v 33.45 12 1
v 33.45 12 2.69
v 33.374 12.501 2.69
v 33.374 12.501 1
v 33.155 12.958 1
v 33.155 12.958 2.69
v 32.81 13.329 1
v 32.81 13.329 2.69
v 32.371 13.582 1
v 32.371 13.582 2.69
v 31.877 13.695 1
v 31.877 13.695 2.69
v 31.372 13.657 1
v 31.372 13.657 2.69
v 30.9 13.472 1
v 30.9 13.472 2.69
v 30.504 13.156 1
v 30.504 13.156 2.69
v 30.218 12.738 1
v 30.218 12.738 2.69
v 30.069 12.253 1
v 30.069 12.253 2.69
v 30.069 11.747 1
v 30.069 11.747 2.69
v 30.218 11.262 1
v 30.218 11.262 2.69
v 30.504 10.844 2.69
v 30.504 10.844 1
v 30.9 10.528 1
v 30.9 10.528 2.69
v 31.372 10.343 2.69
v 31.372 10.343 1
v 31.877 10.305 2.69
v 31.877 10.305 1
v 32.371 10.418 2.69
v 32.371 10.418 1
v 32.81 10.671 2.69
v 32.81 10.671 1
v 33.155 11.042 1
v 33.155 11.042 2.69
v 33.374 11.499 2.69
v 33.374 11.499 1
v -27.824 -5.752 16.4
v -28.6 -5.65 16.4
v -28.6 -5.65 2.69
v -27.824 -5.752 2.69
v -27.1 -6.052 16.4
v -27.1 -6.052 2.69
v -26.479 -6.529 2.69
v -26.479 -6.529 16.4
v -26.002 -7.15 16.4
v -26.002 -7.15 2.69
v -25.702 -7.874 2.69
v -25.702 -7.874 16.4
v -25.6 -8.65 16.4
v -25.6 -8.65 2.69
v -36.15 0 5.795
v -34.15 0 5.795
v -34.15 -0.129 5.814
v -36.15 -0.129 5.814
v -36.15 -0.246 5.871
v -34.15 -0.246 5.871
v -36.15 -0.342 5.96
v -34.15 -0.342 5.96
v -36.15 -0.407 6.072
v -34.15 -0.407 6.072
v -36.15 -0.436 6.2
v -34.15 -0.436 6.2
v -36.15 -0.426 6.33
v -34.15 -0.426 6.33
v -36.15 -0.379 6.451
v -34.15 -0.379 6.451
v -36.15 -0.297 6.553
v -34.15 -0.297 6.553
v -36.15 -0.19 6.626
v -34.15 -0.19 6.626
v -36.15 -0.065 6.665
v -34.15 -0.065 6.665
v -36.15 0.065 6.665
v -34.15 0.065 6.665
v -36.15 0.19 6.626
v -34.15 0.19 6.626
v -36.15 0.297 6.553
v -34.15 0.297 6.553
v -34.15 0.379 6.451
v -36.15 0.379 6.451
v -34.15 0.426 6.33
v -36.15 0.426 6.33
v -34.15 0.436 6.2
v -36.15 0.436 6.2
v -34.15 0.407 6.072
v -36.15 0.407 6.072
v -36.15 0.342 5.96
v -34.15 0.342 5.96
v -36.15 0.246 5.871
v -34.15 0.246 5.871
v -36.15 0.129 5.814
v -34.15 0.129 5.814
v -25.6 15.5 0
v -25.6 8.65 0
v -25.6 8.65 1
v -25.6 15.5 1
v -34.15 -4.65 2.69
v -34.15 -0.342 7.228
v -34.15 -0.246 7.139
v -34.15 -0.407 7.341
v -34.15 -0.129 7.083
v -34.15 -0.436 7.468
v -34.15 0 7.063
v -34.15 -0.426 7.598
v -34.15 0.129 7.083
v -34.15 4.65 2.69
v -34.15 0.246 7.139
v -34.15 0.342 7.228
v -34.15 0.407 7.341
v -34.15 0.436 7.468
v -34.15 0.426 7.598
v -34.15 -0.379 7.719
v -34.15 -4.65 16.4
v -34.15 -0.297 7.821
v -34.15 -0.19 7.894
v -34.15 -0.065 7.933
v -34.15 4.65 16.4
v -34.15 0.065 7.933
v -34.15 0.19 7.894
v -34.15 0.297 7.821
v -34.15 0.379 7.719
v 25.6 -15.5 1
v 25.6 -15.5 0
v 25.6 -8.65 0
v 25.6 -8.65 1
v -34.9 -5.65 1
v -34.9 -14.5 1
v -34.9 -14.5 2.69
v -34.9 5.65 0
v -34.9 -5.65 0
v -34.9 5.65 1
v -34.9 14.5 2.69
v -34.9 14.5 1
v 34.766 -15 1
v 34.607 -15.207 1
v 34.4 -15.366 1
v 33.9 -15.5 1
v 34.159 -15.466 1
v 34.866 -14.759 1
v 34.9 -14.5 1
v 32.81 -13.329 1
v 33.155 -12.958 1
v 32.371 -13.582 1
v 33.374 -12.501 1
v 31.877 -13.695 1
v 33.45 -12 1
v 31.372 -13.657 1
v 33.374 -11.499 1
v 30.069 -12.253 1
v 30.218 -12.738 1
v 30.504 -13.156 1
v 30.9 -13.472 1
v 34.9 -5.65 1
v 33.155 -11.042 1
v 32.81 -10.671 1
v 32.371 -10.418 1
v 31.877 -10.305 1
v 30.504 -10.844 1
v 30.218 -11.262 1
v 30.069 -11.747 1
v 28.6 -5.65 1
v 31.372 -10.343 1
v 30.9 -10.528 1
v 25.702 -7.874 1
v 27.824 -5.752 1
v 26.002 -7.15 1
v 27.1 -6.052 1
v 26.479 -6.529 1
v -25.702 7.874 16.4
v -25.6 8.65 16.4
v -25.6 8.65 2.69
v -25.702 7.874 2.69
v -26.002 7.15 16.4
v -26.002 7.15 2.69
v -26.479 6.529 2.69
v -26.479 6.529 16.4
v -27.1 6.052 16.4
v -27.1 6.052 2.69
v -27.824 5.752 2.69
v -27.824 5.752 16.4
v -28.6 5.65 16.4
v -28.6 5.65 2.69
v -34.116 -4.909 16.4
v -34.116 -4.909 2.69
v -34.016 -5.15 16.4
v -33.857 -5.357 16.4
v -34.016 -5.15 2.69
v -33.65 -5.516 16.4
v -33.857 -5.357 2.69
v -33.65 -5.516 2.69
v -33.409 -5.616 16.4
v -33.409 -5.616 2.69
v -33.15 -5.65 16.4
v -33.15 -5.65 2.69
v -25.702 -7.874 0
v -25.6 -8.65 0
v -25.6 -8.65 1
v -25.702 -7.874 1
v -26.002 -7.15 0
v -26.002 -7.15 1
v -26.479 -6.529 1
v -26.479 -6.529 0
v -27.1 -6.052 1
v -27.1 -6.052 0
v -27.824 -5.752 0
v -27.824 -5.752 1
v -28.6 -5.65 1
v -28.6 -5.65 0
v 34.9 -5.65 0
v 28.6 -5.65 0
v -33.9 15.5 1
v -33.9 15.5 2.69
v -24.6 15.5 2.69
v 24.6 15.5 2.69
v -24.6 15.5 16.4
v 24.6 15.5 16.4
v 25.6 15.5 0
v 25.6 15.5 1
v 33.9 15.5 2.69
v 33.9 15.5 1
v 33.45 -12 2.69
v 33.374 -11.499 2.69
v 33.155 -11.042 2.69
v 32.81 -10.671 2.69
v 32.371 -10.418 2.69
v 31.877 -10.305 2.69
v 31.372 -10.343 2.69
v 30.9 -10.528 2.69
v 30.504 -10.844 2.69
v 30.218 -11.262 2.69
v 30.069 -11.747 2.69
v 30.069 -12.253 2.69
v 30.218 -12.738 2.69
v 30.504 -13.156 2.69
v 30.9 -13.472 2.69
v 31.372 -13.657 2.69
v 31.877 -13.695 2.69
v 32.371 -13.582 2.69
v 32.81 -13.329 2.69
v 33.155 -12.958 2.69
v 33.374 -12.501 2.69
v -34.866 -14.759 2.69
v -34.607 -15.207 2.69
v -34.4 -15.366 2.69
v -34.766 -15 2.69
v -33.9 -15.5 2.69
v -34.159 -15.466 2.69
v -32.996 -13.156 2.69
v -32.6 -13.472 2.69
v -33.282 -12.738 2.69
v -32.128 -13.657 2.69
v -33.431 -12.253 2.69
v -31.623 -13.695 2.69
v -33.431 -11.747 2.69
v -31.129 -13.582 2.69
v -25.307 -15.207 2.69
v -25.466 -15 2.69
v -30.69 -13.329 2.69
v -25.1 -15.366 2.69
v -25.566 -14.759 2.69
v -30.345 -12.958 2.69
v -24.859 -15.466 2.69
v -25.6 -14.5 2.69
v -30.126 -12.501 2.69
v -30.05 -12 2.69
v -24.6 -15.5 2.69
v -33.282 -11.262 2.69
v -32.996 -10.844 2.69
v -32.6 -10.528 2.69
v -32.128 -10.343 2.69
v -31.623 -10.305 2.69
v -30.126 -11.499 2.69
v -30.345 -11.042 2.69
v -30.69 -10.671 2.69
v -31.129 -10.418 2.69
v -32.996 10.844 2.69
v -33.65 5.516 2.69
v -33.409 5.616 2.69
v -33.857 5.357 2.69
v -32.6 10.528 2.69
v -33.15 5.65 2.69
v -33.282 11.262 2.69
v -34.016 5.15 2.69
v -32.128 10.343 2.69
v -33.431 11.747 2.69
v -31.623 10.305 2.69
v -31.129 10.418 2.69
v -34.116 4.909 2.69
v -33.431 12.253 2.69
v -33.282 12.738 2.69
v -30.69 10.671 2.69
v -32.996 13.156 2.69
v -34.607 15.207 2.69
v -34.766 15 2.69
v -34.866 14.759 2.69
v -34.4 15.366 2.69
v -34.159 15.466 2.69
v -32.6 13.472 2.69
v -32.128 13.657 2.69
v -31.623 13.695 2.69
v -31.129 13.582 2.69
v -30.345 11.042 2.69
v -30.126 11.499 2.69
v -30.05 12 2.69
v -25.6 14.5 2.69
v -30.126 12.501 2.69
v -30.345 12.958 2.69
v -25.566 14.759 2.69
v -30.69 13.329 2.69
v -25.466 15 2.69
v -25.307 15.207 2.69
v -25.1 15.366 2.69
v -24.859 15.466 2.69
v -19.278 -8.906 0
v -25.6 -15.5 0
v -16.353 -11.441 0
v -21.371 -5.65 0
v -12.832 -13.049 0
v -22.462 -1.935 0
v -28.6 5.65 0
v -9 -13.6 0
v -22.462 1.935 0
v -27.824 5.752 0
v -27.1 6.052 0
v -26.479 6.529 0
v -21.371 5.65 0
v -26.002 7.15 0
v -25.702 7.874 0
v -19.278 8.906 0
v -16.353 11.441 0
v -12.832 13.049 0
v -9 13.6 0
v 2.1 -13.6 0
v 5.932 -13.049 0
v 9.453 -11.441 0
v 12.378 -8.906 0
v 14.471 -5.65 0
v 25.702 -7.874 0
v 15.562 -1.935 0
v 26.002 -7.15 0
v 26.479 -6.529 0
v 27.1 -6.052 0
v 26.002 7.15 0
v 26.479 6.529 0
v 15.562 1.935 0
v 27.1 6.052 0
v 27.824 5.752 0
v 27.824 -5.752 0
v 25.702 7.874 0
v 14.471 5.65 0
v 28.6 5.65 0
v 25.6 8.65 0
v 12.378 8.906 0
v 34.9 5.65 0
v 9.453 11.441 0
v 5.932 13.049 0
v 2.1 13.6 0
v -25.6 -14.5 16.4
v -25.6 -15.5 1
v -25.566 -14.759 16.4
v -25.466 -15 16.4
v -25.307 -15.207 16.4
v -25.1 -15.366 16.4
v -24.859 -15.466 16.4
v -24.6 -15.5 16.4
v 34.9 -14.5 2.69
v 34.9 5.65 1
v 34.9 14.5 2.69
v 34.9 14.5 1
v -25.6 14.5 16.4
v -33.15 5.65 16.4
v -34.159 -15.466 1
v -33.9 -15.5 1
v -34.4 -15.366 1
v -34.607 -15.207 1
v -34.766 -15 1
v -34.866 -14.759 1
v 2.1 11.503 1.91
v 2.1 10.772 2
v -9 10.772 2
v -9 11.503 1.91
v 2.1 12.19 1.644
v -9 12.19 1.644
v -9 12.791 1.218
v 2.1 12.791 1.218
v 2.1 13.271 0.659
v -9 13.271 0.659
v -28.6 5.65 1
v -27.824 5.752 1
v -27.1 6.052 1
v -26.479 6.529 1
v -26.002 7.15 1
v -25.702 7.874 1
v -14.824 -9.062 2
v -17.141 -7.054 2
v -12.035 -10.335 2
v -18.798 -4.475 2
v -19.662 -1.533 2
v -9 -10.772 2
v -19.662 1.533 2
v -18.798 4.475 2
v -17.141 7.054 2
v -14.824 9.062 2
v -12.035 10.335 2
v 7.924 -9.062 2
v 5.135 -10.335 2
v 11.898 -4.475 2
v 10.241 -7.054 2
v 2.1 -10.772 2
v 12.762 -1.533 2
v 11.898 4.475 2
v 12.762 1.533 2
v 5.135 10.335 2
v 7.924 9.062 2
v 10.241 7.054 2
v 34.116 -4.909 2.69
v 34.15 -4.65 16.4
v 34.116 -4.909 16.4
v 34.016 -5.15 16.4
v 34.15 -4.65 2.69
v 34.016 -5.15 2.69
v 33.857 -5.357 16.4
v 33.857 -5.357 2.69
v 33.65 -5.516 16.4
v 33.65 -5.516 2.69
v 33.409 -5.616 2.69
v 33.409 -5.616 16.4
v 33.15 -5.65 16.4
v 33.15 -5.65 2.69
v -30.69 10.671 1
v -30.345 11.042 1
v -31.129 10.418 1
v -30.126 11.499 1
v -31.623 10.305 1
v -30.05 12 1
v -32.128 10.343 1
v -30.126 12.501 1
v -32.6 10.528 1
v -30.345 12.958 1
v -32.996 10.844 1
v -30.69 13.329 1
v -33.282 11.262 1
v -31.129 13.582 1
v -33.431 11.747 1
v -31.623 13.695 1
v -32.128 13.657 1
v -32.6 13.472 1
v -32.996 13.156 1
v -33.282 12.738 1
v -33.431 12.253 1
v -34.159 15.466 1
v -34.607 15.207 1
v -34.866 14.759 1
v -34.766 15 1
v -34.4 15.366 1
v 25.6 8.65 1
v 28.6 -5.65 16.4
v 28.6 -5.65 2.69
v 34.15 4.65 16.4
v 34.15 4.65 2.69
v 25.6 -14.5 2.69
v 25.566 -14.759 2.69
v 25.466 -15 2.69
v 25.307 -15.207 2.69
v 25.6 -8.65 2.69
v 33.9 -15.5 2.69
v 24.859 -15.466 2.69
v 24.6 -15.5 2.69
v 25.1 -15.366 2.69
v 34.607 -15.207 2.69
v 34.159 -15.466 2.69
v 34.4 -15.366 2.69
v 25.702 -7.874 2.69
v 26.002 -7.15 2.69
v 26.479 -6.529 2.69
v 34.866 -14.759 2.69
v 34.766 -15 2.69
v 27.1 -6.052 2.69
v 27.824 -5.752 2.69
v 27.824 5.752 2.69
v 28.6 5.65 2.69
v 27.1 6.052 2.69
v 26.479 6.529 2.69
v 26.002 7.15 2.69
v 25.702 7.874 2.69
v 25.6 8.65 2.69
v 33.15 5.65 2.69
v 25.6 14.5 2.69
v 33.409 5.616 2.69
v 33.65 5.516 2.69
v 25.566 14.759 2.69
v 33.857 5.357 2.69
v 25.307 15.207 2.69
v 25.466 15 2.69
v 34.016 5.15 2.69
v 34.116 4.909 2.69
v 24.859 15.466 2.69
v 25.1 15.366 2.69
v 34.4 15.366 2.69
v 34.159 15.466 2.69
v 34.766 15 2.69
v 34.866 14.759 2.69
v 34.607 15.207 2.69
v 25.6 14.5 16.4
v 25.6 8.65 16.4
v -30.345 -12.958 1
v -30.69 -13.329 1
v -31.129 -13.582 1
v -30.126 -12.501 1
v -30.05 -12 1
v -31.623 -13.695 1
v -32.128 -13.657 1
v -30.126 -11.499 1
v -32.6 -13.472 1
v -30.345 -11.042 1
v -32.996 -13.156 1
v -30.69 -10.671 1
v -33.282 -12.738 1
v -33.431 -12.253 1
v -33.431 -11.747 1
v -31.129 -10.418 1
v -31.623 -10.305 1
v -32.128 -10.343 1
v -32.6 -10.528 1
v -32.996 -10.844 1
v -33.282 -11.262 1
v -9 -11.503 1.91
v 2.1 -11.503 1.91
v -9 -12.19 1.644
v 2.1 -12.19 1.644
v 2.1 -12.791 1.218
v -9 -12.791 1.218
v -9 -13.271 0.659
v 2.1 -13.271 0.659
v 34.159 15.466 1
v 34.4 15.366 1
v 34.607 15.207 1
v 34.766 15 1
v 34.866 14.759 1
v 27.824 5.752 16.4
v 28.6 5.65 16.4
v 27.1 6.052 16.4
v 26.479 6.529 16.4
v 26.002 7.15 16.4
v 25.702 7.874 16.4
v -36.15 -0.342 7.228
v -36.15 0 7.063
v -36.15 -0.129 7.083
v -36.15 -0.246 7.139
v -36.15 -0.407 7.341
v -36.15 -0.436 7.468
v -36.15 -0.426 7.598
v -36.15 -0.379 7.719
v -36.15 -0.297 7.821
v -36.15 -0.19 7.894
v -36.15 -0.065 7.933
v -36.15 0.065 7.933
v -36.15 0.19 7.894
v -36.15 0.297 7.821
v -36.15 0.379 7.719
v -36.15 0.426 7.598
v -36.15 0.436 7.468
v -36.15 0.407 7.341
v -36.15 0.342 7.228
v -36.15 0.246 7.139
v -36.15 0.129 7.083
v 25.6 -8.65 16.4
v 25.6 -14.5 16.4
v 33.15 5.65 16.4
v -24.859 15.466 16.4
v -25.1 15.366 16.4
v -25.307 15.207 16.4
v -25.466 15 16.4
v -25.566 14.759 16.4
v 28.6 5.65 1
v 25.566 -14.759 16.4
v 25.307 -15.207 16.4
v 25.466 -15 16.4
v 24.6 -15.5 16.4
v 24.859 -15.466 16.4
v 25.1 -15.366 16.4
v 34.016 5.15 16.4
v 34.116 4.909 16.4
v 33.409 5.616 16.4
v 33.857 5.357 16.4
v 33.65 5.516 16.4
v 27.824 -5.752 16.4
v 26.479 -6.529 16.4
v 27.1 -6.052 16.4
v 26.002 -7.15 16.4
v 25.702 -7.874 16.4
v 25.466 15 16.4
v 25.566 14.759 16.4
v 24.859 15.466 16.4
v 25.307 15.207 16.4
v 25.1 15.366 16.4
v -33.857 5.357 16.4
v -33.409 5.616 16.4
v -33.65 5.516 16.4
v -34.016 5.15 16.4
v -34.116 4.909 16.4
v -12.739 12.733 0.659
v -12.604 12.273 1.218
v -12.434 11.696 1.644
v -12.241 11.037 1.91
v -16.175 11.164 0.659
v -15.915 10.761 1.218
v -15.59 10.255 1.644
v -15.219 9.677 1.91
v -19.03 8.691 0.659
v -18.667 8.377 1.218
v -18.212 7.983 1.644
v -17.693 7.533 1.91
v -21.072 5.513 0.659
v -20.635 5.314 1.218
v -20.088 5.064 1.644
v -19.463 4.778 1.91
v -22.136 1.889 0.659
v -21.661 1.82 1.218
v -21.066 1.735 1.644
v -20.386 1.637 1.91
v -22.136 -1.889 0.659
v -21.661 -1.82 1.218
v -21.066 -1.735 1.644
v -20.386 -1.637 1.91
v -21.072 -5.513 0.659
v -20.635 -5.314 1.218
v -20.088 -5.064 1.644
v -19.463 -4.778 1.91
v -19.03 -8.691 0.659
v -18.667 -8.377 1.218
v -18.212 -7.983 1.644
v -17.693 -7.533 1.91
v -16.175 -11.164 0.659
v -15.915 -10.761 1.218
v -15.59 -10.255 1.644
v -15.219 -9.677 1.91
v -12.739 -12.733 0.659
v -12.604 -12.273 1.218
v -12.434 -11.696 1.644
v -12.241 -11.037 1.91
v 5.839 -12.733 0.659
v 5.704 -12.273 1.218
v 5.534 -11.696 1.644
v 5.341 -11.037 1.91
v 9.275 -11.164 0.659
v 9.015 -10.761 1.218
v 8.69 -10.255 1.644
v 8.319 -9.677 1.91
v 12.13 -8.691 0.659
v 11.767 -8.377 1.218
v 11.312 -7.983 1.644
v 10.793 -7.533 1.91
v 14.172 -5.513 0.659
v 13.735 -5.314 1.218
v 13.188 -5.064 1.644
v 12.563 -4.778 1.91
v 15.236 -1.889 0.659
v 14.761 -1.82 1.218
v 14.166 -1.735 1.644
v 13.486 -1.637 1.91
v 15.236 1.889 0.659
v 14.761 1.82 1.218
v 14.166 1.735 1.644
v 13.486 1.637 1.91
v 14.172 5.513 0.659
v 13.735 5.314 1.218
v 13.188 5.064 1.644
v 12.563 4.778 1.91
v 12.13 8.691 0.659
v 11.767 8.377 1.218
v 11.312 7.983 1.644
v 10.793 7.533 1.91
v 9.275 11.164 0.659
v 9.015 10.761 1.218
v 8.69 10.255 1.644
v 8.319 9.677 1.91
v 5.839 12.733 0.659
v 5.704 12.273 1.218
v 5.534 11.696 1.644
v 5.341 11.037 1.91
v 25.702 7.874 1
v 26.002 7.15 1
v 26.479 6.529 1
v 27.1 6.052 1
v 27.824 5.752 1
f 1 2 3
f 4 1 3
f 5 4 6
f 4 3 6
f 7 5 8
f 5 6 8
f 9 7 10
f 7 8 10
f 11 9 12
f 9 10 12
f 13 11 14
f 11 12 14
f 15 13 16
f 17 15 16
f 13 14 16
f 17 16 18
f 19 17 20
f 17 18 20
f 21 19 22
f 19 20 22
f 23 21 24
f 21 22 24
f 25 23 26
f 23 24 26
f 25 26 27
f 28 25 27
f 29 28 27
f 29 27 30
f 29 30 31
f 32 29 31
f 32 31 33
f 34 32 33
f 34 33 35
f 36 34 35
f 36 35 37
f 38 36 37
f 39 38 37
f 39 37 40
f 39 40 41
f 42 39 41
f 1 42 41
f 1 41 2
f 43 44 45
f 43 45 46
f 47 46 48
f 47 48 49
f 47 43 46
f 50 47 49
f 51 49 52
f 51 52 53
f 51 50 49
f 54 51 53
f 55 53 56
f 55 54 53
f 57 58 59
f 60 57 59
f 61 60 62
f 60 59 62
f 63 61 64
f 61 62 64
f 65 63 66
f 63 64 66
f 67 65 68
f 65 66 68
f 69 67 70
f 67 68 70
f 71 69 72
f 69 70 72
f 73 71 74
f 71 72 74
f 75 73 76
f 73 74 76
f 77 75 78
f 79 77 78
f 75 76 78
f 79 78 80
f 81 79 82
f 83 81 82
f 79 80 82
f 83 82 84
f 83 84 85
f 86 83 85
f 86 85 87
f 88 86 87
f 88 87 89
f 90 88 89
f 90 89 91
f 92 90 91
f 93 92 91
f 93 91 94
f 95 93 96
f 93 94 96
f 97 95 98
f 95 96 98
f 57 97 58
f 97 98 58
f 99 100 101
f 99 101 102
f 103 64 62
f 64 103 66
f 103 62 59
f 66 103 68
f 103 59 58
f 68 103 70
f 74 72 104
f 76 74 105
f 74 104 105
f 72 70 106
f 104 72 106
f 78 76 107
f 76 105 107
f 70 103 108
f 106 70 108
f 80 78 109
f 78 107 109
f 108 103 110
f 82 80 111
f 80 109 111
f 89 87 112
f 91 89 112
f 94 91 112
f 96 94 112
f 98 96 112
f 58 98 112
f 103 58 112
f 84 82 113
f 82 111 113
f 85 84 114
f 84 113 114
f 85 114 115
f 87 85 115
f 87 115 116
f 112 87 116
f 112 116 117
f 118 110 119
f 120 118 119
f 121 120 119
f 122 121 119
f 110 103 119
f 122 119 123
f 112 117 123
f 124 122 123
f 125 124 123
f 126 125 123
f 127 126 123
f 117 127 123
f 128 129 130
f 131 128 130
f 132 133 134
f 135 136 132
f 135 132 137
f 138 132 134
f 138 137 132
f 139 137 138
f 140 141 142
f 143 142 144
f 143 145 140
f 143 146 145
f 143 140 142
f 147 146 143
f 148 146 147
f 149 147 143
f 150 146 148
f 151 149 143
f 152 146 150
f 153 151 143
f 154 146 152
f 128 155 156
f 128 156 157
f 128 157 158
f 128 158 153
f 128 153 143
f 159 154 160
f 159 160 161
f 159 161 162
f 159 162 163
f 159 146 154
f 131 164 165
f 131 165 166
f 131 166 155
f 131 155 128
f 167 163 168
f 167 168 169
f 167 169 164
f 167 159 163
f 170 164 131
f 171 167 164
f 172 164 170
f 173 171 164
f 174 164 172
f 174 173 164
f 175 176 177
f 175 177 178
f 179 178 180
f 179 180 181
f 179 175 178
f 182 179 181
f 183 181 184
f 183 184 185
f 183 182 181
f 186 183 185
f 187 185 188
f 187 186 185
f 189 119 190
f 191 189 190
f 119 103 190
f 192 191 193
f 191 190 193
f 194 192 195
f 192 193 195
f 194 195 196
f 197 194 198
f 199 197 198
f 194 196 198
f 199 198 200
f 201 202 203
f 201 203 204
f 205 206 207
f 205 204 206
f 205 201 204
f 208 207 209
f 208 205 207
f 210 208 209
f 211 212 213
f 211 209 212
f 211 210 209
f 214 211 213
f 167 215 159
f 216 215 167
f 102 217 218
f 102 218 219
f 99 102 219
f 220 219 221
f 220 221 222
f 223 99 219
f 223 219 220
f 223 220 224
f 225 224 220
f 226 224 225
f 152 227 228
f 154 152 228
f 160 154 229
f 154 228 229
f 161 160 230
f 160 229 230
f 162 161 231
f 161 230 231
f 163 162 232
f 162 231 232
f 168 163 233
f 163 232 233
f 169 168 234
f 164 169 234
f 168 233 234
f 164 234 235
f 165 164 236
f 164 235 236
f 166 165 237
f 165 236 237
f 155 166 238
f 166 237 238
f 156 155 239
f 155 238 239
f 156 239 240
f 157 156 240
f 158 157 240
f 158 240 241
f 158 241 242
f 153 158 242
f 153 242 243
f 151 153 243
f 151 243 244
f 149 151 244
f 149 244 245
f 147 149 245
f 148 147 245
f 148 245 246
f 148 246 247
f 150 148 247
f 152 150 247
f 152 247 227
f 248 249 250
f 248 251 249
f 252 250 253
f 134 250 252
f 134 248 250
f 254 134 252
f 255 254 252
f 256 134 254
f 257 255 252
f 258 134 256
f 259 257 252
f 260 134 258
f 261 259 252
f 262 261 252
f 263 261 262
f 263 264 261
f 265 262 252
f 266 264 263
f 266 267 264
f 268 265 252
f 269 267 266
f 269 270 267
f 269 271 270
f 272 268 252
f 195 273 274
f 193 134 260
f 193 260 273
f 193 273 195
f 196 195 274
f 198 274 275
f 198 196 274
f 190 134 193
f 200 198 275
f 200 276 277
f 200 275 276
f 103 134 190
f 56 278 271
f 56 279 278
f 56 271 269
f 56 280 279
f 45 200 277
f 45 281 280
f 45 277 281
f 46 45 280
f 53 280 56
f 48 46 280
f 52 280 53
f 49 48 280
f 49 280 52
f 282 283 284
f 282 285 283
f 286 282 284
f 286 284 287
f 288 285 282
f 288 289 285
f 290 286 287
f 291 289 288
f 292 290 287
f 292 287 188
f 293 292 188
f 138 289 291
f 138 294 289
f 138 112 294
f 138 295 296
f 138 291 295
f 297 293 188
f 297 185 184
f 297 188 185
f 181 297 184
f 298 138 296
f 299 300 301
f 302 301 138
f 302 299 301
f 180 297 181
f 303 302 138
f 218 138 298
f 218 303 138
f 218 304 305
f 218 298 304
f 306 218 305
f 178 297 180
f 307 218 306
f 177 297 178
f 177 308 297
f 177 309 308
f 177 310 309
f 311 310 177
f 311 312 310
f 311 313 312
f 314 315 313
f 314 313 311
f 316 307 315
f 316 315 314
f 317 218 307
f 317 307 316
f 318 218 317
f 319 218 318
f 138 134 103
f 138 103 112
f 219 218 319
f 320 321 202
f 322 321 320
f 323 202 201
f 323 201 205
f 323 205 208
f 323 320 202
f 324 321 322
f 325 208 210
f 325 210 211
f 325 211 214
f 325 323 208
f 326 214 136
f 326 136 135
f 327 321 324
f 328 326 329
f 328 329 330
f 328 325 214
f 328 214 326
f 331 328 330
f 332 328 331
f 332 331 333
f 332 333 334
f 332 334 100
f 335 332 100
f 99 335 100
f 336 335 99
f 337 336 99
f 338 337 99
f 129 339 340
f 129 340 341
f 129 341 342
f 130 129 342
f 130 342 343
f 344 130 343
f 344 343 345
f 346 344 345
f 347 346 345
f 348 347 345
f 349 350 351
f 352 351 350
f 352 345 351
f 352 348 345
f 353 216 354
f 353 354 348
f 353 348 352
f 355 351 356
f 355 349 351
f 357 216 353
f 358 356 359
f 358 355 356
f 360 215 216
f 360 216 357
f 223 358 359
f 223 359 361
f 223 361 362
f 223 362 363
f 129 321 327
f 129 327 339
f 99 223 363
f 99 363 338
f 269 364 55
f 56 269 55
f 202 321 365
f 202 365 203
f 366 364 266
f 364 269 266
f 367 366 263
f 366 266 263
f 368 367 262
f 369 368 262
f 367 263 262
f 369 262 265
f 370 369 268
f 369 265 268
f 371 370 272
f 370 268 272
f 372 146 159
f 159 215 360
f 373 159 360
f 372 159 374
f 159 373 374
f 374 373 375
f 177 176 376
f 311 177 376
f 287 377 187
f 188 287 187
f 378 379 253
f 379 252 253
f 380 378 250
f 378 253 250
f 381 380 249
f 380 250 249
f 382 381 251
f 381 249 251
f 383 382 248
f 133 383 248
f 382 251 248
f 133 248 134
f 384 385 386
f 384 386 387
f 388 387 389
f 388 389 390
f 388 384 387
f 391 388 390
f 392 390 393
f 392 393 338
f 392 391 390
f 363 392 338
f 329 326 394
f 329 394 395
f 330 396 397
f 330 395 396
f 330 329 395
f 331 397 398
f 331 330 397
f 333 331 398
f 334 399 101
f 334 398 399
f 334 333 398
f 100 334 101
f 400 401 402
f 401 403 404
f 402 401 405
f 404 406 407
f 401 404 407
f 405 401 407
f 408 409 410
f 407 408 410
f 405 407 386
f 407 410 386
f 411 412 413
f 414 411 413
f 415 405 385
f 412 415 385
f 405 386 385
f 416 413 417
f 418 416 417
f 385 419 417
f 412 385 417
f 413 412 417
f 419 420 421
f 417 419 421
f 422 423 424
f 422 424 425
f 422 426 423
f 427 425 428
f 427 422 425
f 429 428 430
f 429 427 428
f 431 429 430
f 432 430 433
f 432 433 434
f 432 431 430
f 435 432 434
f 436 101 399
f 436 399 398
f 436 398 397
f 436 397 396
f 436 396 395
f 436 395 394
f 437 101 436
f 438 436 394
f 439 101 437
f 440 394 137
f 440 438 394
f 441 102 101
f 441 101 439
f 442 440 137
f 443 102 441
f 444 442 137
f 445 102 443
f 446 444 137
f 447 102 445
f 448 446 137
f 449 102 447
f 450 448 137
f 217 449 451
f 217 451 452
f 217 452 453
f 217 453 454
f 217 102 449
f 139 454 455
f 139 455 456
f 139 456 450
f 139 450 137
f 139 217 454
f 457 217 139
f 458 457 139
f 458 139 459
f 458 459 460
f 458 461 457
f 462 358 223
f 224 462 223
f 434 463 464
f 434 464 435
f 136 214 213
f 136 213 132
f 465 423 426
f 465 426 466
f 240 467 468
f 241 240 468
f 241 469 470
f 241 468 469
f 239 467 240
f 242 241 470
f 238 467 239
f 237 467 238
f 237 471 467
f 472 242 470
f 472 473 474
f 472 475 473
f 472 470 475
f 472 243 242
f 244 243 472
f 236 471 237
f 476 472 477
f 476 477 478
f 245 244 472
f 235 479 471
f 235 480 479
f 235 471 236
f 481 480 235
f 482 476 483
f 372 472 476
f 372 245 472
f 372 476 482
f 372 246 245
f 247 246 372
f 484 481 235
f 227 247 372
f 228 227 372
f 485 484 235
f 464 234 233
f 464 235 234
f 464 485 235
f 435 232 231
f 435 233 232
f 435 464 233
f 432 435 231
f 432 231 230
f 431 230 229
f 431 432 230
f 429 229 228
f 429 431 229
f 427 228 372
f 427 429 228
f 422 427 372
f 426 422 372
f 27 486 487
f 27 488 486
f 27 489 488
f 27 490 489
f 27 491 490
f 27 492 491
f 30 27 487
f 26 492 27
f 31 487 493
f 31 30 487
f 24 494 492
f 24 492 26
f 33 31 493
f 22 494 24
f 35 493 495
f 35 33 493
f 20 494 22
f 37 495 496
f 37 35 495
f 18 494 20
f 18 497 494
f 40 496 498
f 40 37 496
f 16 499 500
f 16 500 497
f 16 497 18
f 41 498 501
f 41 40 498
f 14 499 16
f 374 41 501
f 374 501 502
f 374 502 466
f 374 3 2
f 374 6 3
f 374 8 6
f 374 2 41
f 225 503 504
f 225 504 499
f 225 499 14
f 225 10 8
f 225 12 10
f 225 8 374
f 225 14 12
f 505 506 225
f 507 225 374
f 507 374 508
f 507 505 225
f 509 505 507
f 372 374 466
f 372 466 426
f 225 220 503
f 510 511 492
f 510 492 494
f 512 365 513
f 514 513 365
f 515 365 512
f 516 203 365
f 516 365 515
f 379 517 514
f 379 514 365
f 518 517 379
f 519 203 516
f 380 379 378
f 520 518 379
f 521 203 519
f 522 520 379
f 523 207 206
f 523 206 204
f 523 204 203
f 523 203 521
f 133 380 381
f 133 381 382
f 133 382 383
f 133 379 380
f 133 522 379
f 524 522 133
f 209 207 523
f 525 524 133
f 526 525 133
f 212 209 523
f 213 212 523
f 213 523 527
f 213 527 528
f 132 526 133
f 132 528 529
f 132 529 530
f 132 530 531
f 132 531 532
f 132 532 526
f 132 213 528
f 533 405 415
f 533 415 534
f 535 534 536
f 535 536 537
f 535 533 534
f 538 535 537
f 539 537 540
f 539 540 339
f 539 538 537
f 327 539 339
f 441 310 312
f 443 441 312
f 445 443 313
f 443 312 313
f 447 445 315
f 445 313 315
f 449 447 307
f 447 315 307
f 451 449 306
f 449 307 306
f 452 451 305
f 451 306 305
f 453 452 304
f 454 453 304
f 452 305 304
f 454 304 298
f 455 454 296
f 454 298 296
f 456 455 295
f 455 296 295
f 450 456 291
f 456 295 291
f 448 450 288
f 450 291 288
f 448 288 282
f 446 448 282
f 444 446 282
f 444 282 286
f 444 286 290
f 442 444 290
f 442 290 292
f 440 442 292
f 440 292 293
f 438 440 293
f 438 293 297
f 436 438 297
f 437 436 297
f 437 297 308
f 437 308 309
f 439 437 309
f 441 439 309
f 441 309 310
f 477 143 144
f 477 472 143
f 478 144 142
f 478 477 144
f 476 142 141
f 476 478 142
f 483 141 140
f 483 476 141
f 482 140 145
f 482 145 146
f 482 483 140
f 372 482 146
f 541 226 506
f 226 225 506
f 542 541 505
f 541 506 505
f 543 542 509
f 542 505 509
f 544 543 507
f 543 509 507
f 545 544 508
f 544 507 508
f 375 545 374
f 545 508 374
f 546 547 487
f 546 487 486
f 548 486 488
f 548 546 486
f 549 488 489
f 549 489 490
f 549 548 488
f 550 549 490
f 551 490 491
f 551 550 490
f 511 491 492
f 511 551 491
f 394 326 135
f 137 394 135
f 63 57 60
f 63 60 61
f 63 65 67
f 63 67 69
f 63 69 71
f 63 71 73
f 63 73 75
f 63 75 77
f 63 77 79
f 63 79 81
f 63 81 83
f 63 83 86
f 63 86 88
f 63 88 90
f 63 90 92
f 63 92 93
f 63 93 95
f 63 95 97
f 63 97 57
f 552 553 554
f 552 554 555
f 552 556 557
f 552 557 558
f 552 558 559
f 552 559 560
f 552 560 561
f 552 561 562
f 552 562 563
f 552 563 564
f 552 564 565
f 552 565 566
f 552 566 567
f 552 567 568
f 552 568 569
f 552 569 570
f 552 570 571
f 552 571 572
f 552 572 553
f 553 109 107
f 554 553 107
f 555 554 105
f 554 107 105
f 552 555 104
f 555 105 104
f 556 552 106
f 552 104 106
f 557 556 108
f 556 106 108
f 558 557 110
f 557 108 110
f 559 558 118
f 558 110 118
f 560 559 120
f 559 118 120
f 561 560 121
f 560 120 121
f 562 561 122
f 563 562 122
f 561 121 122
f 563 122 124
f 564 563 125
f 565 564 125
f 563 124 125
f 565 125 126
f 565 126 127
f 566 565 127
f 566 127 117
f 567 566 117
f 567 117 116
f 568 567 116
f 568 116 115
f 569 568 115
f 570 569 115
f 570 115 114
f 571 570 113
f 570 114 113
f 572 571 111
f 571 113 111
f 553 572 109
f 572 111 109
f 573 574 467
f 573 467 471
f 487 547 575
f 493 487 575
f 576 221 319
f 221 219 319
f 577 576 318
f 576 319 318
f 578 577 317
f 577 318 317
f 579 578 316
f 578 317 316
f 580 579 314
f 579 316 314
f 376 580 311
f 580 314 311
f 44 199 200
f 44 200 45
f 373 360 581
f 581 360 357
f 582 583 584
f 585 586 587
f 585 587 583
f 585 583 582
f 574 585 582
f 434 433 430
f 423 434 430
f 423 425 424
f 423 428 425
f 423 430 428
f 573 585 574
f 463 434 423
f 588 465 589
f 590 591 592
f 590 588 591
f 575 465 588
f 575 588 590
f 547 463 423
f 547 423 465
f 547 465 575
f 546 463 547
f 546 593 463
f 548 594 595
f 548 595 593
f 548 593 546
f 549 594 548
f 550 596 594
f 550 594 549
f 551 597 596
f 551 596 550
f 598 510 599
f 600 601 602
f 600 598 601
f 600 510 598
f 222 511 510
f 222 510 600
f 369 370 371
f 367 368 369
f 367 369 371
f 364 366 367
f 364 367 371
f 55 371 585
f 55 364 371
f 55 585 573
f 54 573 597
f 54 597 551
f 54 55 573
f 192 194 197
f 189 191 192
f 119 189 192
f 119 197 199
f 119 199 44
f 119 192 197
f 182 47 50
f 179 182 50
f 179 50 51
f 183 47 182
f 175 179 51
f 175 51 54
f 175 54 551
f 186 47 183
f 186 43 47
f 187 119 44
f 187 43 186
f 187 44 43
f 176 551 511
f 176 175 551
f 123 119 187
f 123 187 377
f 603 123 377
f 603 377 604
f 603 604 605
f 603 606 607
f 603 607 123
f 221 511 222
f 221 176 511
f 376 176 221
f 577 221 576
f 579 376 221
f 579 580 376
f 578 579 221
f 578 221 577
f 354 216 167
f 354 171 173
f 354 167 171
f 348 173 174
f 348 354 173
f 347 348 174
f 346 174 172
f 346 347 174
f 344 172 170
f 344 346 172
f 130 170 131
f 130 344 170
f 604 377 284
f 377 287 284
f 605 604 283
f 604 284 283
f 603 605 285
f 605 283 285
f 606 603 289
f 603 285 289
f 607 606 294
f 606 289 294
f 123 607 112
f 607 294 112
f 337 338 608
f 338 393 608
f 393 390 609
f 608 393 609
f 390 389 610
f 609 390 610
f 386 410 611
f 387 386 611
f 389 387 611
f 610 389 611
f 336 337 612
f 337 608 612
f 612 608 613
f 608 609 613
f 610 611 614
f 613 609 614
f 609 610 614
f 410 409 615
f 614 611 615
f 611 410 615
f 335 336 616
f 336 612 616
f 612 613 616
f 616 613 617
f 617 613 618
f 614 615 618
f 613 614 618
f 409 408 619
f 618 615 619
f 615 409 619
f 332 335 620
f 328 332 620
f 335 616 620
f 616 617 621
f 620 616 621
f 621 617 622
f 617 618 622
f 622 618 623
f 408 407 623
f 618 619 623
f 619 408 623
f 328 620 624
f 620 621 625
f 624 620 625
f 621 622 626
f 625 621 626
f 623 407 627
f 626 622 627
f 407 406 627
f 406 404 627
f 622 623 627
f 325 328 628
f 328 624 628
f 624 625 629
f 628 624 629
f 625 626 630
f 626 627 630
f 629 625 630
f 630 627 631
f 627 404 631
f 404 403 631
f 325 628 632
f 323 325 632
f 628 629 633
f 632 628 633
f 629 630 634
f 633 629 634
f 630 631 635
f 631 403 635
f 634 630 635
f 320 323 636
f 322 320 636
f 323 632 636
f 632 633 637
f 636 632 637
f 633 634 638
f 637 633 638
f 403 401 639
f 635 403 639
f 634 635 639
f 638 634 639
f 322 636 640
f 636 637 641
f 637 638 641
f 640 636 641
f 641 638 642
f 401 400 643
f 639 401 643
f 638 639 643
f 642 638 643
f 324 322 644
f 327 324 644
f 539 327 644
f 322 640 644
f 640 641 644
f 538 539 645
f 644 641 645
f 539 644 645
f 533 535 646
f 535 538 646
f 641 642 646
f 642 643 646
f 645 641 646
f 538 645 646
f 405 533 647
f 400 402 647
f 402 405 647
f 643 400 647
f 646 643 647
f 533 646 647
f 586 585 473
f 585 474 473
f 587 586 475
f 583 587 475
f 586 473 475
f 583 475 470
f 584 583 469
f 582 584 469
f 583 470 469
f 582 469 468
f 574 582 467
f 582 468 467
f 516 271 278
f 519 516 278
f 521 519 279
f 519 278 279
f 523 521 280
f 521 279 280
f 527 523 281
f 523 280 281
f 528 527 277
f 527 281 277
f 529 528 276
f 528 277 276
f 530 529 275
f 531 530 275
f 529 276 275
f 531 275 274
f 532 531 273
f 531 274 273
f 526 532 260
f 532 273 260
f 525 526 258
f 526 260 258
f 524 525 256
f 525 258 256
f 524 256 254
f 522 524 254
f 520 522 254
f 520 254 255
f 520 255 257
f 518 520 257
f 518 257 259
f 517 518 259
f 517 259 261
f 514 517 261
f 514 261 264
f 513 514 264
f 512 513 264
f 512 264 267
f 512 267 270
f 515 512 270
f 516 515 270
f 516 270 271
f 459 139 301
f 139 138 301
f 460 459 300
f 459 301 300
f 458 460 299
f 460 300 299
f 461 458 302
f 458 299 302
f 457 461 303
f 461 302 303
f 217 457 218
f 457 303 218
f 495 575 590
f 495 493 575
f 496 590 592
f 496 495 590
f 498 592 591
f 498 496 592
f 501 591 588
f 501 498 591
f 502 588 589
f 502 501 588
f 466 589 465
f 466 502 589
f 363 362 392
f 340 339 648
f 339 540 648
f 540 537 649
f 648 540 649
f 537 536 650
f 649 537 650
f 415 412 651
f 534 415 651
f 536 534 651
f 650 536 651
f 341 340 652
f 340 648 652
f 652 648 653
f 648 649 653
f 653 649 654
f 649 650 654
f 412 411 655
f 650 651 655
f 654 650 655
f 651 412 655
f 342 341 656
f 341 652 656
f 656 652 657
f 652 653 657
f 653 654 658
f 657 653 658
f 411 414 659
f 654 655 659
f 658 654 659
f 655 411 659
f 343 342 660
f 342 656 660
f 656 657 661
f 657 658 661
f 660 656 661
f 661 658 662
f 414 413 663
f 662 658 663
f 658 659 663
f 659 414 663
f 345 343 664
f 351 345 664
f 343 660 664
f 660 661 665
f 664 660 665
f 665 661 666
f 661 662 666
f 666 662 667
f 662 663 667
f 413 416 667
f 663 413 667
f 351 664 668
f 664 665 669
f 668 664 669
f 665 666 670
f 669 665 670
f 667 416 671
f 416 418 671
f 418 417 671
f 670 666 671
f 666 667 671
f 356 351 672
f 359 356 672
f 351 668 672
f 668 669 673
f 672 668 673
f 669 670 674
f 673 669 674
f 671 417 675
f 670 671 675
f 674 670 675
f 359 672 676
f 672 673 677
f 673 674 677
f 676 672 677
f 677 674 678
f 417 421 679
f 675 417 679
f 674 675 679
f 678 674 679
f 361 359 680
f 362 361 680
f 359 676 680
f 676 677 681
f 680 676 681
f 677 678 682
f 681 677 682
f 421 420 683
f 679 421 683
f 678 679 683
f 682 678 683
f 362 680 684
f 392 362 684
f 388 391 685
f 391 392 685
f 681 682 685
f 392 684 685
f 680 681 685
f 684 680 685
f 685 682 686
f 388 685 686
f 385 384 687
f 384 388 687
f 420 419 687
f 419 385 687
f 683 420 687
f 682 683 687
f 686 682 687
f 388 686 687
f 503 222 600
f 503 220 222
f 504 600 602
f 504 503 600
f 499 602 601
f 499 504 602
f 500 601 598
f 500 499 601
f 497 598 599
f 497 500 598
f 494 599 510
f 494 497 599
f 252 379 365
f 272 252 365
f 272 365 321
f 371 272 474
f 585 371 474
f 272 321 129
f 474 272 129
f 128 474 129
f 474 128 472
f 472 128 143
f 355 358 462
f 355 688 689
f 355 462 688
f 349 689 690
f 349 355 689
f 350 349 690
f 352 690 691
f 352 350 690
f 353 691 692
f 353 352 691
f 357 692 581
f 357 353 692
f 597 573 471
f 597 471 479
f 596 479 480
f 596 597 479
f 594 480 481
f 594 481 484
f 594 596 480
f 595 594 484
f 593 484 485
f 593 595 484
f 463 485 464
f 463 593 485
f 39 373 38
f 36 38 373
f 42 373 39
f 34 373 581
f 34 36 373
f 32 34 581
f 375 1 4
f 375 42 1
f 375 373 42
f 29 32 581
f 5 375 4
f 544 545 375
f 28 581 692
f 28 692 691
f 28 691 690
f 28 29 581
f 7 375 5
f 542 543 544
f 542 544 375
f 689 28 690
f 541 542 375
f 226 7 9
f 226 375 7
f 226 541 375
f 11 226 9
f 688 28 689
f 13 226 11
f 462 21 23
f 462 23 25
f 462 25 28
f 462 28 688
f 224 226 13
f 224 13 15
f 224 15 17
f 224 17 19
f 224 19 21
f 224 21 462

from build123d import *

# Parameters (mm, degrees)
SKETCH_1_W          = 69.8
SKETCH_1_H          = 31
EXTRUDE_1_DEPTH     = 16.4
SKETCH_2_W          = 9.3
SKETCH_2_H          = 9.85
CUT_EXTRUDE_1_DEPTH = 1
SKETCH_3_W          = 9.3
SKETCH_3_H          = 9.85
CUT_EXTRUDE_2_DEPTH = 13.71
CUT_EXTRUDE_3_DEPTH = 2
HOLE_WIZARD_M3_1_D  = 3.4
SKETCH_8_W          = 0.75
SKETCH_8_H          = 11.3
CUT_EXTRUDE_5_DEPTH = 13.71
SKETCH_9_R          = 0.437276748
EXTRUDE_3_DEPTH     = 2
FILLET_1_R          = 3
FILLET_2_R          = 1


with BuildPart() as part:
    # 草图1 → 凸台-拉伸1 (new body)
    with BuildSketch(Plane.XY):
        Rectangle(SKETCH_1_W, SKETCH_1_H)
    extrude(amount=EXTRUDE_1_DEPTH)

    # 草图2 → 切除-拉伸1 (cut)
    with BuildSketch(Plane(origin=(0, 0, 0), x_dir=(-1, 0, 0), z_dir=(0, 0, -1))):
        with Locations((-30.25, 10.575)):
            Rectangle(SKETCH_2_W, SKETCH_2_H)
        with Locations((-30.25, -10.575)):
            Rectangle(SKETCH_2_W, SKETCH_2_H)
        with Locations((30.25, -10.575)):
            Rectangle(SKETCH_2_W, SKETCH_2_H)
        with Locations((30.25, 10.575)):
            Rectangle(SKETCH_2_W, SKETCH_2_H)
    extrude(amount=-CUT_EXTRUDE_1_DEPTH, mode=Mode.SUBTRACT)

    # 草图3 → 切除-拉伸2 (cut)
    with BuildSketch(Plane.XY.offset(16.4)):
        with Locations((30.25, -10.575)):
            Rectangle(SKETCH_3_W, SKETCH_3_H)
        with Locations((-30.25, -10.575)):
            Rectangle(SKETCH_3_W, SKETCH_3_H)
        with Locations((30.25, 10.575)):
            Rectangle(SKETCH_3_W, SKETCH_3_H)
        with Locations((-30.25, 10.575)):
            Rectangle(SKETCH_3_W, SKETCH_3_H)
    extrude(amount=-CUT_EXTRUDE_2_DEPTH, mode=Mode.SUBTRACT)

    # 草图4 → 切除-拉伸3 (cut)
    with BuildSketch(Plane(origin=(0, 0, 0), x_dir=(-1, 0, 0), z_dir=(0, 0, -1))):
        with BuildLine():
            Line((-2.1, 13.6), (9, 13.6))
            ThreePointArc((9, 13.6), (22.6, 0), (9, -13.6))
            Line((9, -13.6), (-2.1, -13.6))
            ThreePointArc((-2.1, -13.6), (-15.7, 0), (-2.1, 13.6))
        make_face()
    extrude(amount=-CUT_EXTRUDE_3_DEPTH, mode=Mode.SUBTRACT)

    # M3 间隙孔1 (through all)
    with Locations(Plane(origin=(0, 0, 1), x_dir=(-1, 0, 0), z_dir=(0, 0, -1))):
        with Locations((31.75, 12), (31.75, -12), (-31.75, -12), (-31.75, 12)):
            Hole(HOLE_WIZARD_M3_1_D / 2)

    # 草图8 → 切除-拉伸5 (cut)
    with BuildSketch(Plane.XY.offset(16.4)):
        with Locations((-34.525, 0)):
            Rectangle(SKETCH_8_W, SKETCH_8_H)
        with Locations((34.525, 0)):
            Rectangle(SKETCH_8_W, SKETCH_8_H)
    extrude(amount=-CUT_EXTRUDE_5_DEPTH, mode=Mode.SUBTRACT)

    # 草图9 → 凸台-拉伸3 (add)
    with BuildSketch(Plane.ZY.offset(34.15)):
        with Locations(Location((6.232254634, 0, 0), (0, 0, 180))):
            Circle(SKETCH_9_R)
        with Locations(Location((7.500357203, 0, 0), (0, 0, 180))):
            Circle(SKETCH_9_R)
    extrude(amount=EXTRUDE_3_DEPTH)

    # 圆角1
    # the kernel refuses this fillet: 3 mm, written as the material it adds along each edge
    with BuildSketch(Plane(origin=(-9, -13.6, 2), x_dir=(0, 0, -1), z_dir=(1, 0, 0)), Plane(origin=(2.1, 13.6, 2), x_dir=(0, 0, -1), z_dir=(-1, 0, 0))) as fillet_1_piece_1:
        with BuildLine():
            CenterArc((3, 2.828427125), FILLET_1_R, 180, 70.528779366)
            Line((0, 2.828427125), (-0.06, 2.828427125))
            Line((-0.06, 2.828427125), (-0.06, 0))
            Line((-0.06, 0), (0, -0.06))
            ThreePointArc((0, -0.06), (1, -0.06), (1.98, -0.056568542))
            Line((1.98, -0.056568542), (2, 0))
        make_face()
    extrude(amount=11.1)
    with BuildSketch(Plane(origin=(2.1, 0, 2), x_dir=(0, -1, 0), z_dir=(-1, 0, 0))) as fillet_1_piece_2:
        with BuildLine():
            CenterArc((10.771572875, -3), FILLET_1_R, 19.471220634, 70.528779366)
            Line((10.771572875, 0), (10.771572875, 0.06))
            Line((10.771572875, 0.06), (13.6, 0.06))
            Line((13.6, 0.06), (13.66, 0))
            ThreePointArc((13.66, 0), (13.66, -1), (13.656568542, -1.98))
            Line((13.656568542, -1.98), (13.6, -2))
        make_face()
    revolve(axis=Axis((2.1, 0, 2), (0, 0, 1)), revolution_arc=180)
    with BuildSketch(Plane(origin=(-9, 0, 2), x_dir=(0, 1, 0), z_dir=(1, 0, 0))) as fillet_1_piece_3:
        with BuildLine():
            CenterArc((10.771572875, -3), FILLET_1_R, 19.471220634, 70.528779366)
            Line((10.771572875, 0), (10.771572875, 0.06))
            Line((10.771572875, 0.06), (13.6, 0.06))
            Line((13.6, 0.06), (13.66, 0))
            ThreePointArc((13.66, 0), (13.66, -1), (13.656568542, -1.98))
            Line((13.656568542, -1.98), (13.6, -2))
        make_face()
    revolve(axis=Axis((-9, 0, 2), (0, 0, 1)), revolution_arc=180)
    with BuildSketch(Plane(origin=(-25.6, -5.65, 0), x_dir=(0, -1, 0), z_dir=(0, 0, 1)), Plane(origin=(-25.6, 5.65, 0), x_dir=(-1, 0, 0), z_dir=(0, 0, 1))) as fillet_1_piece_4:
        with BuildLine():
            CenterArc((FILLET_1_R, -FILLET_1_R), FILLET_1_R, 90, 90)
            Line((0, -FILLET_1_R), (-FILLET_1_R * 0.02, -FILLET_1_R))
            Line((-FILLET_1_R * 0.02, -FILLET_1_R), (-FILLET_1_R * 0.02, FILLET_1_R * 0.02))
            Line((-FILLET_1_R * 0.02, FILLET_1_R * 0.02), (FILLET_1_R, FILLET_1_R * 0.02))
            Line((FILLET_1_R, FILLET_1_R * 0.02), (FILLET_1_R, 0))
        make_face()
    extrude(amount=8.5)
    with BuildSketch(Plane(origin=(25.6, -5.65, 0), x_dir=(0, -1, 0), z_dir=(0, 0, 1)), Plane(origin=(25.6, 5.65, 0), x_dir=(1, 0, 0), z_dir=(0, 0, 1))) as fillet_1_piece_5:
        with BuildLine():
            CenterArc((FILLET_1_R, FILLET_1_R), FILLET_1_R, 180, 90)
            Line((0, FILLET_1_R), (-FILLET_1_R * 0.02, FILLET_1_R))
            Line((-FILLET_1_R * 0.02, FILLET_1_R), (-FILLET_1_R * 0.02, -FILLET_1_R * 0.02))
            Line((-FILLET_1_R * 0.02, -FILLET_1_R * 0.02), (FILLET_1_R, -FILLET_1_R * 0.02))
            Line((FILLET_1_R, -FILLET_1_R * 0.02), (FILLET_1_R, 0))
        make_face()
    extrude(amount=8.5)
    with BuildSketch(Plane(origin=(-25.6, 5.65, 16.4), x_dir=(-1, 0, 0), z_dir=(0, 0, -1))) as fillet_1_piece_6_section:
        with BuildLine():
            CenterArc((FILLET_1_R, FILLET_1_R), FILLET_1_R, 180, 90)
            Line((0, FILLET_1_R), (-FILLET_1_R * 0.02, FILLET_1_R))
            Line((-FILLET_1_R * 0.02, FILLET_1_R), (-FILLET_1_R * 0.02, -FILLET_1_R * 0.02))
            Line((-FILLET_1_R * 0.02, -FILLET_1_R * 0.02), (FILLET_1_R, -FILLET_1_R * 0.02))
            Line((FILLET_1_R, -FILLET_1_R * 0.02), (FILLET_1_R, 0))
        make_face()
    fillet_1_piece_6 = extrude(amount=21.21, mode=Mode.PRIVATE)
    fillet_1_piece_6 = split(fillet_1_piece_6, bisect_by=Plane(origin=(-26.279185343, 6.329185343, 0), z_dir=(0, 0, 1)), keep=Keep.TOP, mode=Mode.PRIVATE)
    add(fillet_1_piece_6)
    with BuildSketch(Plane(origin=(25.6, 5.65, 16.4), x_dir=(1, 0, 0), z_dir=(0, 0, -1))) as fillet_1_piece_7_section:
        with BuildLine():
            CenterArc((FILLET_1_R, -FILLET_1_R), FILLET_1_R, 90, 90)
            Line((0, -FILLET_1_R), (-FILLET_1_R * 0.02, -FILLET_1_R))
            Line((-FILLET_1_R * 0.02, -FILLET_1_R), (-FILLET_1_R * 0.02, FILLET_1_R * 0.02))
            Line((-FILLET_1_R * 0.02, FILLET_1_R * 0.02), (FILLET_1_R, FILLET_1_R * 0.02))
            Line((FILLET_1_R, FILLET_1_R * 0.02), (FILLET_1_R, 0))
        make_face()
    fillet_1_piece_7 = extrude(amount=21.21, mode=Mode.PRIVATE)
    fillet_1_piece_7 = split(fillet_1_piece_7, bisect_by=Plane(origin=(26.279185343, 6.329185343, 0), z_dir=(0, 0, 1)), keep=Keep.TOP, mode=Mode.PRIVATE)
    add(fillet_1_piece_7)
    with BuildSketch(Plane(origin=(25.6, -5.65, 16.4), x_dir=(0, -1, 0), z_dir=(0, 0, -1))) as fillet_1_piece_8_section:
        with BuildLine():
            CenterArc((FILLET_1_R, -FILLET_1_R), FILLET_1_R, 90, 90)
            Line((0, -FILLET_1_R), (-FILLET_1_R * 0.02, -FILLET_1_R))
            Line((-FILLET_1_R * 0.02, -FILLET_1_R), (-FILLET_1_R * 0.02, FILLET_1_R * 0.02))
            Line((-FILLET_1_R * 0.02, FILLET_1_R * 0.02), (FILLET_1_R, FILLET_1_R * 0.02))
            Line((FILLET_1_R, FILLET_1_R * 0.02), (FILLET_1_R, 0))
        make_face()
    fillet_1_piece_8 = extrude(amount=21.21, mode=Mode.PRIVATE)
    fillet_1_piece_8 = split(fillet_1_piece_8, bisect_by=Plane(origin=(26.279185343, -6.329185343, 0), z_dir=(0, 0, 1)), keep=Keep.TOP, mode=Mode.PRIVATE)
    add(fillet_1_piece_8)
    with BuildSketch(Plane(origin=(-25.6, -5.65, 16.4), x_dir=(0, -1, 0), z_dir=(0, 0, -1))) as fillet_1_piece_9_section:
        with BuildLine():
            CenterArc((FILLET_1_R, FILLET_1_R), FILLET_1_R, 180, 90)
            Line((0, FILLET_1_R), (-FILLET_1_R * 0.02, FILLET_1_R))
            Line((-FILLET_1_R * 0.02, FILLET_1_R), (-FILLET_1_R * 0.02, -FILLET_1_R * 0.02))
            Line((-FILLET_1_R * 0.02, -FILLET_1_R * 0.02), (FILLET_1_R, -FILLET_1_R * 0.02))
            Line((FILLET_1_R, -FILLET_1_R * 0.02), (FILLET_1_R, 0))
        make_face()
    fillet_1_piece_9 = extrude(amount=21.21, mode=Mode.PRIVATE)
    fillet_1_piece_9 = split(fillet_1_piece_9, bisect_by=Plane(origin=(-26.279185343, -6.329185343, 0), z_dir=(0, 0, 1)), keep=Keep.TOP, mode=Mode.PRIVATE)
    add(fillet_1_piece_9)

    # 圆角2
    fillet_2_edges = [part.edges().sort_by_distance(p)[0] for p in [
        (-25.6, 15.5, 9.545),
        (-34.15, -5.65, 9.545),
        (-34.15, 5.65, 9.545),
        (34.15, 5.65, 9.545),
        (34.15, -5.65, 9.545),
        (34.9, -15.5, 1.845),
        (25.6, -15.5, 9.545),
        (-34.9, 15.5, 1.845),
        (34.9, 15.5, 1.845),
        (-34.9, -15.5, 1.845),
        (25.6, 15.5, 9.545),
        (-25.6, -15.5, 9.545),
    ]]
    fillet(fillet_2_edges, radius=FILLET_2_R)


solid = part.part
